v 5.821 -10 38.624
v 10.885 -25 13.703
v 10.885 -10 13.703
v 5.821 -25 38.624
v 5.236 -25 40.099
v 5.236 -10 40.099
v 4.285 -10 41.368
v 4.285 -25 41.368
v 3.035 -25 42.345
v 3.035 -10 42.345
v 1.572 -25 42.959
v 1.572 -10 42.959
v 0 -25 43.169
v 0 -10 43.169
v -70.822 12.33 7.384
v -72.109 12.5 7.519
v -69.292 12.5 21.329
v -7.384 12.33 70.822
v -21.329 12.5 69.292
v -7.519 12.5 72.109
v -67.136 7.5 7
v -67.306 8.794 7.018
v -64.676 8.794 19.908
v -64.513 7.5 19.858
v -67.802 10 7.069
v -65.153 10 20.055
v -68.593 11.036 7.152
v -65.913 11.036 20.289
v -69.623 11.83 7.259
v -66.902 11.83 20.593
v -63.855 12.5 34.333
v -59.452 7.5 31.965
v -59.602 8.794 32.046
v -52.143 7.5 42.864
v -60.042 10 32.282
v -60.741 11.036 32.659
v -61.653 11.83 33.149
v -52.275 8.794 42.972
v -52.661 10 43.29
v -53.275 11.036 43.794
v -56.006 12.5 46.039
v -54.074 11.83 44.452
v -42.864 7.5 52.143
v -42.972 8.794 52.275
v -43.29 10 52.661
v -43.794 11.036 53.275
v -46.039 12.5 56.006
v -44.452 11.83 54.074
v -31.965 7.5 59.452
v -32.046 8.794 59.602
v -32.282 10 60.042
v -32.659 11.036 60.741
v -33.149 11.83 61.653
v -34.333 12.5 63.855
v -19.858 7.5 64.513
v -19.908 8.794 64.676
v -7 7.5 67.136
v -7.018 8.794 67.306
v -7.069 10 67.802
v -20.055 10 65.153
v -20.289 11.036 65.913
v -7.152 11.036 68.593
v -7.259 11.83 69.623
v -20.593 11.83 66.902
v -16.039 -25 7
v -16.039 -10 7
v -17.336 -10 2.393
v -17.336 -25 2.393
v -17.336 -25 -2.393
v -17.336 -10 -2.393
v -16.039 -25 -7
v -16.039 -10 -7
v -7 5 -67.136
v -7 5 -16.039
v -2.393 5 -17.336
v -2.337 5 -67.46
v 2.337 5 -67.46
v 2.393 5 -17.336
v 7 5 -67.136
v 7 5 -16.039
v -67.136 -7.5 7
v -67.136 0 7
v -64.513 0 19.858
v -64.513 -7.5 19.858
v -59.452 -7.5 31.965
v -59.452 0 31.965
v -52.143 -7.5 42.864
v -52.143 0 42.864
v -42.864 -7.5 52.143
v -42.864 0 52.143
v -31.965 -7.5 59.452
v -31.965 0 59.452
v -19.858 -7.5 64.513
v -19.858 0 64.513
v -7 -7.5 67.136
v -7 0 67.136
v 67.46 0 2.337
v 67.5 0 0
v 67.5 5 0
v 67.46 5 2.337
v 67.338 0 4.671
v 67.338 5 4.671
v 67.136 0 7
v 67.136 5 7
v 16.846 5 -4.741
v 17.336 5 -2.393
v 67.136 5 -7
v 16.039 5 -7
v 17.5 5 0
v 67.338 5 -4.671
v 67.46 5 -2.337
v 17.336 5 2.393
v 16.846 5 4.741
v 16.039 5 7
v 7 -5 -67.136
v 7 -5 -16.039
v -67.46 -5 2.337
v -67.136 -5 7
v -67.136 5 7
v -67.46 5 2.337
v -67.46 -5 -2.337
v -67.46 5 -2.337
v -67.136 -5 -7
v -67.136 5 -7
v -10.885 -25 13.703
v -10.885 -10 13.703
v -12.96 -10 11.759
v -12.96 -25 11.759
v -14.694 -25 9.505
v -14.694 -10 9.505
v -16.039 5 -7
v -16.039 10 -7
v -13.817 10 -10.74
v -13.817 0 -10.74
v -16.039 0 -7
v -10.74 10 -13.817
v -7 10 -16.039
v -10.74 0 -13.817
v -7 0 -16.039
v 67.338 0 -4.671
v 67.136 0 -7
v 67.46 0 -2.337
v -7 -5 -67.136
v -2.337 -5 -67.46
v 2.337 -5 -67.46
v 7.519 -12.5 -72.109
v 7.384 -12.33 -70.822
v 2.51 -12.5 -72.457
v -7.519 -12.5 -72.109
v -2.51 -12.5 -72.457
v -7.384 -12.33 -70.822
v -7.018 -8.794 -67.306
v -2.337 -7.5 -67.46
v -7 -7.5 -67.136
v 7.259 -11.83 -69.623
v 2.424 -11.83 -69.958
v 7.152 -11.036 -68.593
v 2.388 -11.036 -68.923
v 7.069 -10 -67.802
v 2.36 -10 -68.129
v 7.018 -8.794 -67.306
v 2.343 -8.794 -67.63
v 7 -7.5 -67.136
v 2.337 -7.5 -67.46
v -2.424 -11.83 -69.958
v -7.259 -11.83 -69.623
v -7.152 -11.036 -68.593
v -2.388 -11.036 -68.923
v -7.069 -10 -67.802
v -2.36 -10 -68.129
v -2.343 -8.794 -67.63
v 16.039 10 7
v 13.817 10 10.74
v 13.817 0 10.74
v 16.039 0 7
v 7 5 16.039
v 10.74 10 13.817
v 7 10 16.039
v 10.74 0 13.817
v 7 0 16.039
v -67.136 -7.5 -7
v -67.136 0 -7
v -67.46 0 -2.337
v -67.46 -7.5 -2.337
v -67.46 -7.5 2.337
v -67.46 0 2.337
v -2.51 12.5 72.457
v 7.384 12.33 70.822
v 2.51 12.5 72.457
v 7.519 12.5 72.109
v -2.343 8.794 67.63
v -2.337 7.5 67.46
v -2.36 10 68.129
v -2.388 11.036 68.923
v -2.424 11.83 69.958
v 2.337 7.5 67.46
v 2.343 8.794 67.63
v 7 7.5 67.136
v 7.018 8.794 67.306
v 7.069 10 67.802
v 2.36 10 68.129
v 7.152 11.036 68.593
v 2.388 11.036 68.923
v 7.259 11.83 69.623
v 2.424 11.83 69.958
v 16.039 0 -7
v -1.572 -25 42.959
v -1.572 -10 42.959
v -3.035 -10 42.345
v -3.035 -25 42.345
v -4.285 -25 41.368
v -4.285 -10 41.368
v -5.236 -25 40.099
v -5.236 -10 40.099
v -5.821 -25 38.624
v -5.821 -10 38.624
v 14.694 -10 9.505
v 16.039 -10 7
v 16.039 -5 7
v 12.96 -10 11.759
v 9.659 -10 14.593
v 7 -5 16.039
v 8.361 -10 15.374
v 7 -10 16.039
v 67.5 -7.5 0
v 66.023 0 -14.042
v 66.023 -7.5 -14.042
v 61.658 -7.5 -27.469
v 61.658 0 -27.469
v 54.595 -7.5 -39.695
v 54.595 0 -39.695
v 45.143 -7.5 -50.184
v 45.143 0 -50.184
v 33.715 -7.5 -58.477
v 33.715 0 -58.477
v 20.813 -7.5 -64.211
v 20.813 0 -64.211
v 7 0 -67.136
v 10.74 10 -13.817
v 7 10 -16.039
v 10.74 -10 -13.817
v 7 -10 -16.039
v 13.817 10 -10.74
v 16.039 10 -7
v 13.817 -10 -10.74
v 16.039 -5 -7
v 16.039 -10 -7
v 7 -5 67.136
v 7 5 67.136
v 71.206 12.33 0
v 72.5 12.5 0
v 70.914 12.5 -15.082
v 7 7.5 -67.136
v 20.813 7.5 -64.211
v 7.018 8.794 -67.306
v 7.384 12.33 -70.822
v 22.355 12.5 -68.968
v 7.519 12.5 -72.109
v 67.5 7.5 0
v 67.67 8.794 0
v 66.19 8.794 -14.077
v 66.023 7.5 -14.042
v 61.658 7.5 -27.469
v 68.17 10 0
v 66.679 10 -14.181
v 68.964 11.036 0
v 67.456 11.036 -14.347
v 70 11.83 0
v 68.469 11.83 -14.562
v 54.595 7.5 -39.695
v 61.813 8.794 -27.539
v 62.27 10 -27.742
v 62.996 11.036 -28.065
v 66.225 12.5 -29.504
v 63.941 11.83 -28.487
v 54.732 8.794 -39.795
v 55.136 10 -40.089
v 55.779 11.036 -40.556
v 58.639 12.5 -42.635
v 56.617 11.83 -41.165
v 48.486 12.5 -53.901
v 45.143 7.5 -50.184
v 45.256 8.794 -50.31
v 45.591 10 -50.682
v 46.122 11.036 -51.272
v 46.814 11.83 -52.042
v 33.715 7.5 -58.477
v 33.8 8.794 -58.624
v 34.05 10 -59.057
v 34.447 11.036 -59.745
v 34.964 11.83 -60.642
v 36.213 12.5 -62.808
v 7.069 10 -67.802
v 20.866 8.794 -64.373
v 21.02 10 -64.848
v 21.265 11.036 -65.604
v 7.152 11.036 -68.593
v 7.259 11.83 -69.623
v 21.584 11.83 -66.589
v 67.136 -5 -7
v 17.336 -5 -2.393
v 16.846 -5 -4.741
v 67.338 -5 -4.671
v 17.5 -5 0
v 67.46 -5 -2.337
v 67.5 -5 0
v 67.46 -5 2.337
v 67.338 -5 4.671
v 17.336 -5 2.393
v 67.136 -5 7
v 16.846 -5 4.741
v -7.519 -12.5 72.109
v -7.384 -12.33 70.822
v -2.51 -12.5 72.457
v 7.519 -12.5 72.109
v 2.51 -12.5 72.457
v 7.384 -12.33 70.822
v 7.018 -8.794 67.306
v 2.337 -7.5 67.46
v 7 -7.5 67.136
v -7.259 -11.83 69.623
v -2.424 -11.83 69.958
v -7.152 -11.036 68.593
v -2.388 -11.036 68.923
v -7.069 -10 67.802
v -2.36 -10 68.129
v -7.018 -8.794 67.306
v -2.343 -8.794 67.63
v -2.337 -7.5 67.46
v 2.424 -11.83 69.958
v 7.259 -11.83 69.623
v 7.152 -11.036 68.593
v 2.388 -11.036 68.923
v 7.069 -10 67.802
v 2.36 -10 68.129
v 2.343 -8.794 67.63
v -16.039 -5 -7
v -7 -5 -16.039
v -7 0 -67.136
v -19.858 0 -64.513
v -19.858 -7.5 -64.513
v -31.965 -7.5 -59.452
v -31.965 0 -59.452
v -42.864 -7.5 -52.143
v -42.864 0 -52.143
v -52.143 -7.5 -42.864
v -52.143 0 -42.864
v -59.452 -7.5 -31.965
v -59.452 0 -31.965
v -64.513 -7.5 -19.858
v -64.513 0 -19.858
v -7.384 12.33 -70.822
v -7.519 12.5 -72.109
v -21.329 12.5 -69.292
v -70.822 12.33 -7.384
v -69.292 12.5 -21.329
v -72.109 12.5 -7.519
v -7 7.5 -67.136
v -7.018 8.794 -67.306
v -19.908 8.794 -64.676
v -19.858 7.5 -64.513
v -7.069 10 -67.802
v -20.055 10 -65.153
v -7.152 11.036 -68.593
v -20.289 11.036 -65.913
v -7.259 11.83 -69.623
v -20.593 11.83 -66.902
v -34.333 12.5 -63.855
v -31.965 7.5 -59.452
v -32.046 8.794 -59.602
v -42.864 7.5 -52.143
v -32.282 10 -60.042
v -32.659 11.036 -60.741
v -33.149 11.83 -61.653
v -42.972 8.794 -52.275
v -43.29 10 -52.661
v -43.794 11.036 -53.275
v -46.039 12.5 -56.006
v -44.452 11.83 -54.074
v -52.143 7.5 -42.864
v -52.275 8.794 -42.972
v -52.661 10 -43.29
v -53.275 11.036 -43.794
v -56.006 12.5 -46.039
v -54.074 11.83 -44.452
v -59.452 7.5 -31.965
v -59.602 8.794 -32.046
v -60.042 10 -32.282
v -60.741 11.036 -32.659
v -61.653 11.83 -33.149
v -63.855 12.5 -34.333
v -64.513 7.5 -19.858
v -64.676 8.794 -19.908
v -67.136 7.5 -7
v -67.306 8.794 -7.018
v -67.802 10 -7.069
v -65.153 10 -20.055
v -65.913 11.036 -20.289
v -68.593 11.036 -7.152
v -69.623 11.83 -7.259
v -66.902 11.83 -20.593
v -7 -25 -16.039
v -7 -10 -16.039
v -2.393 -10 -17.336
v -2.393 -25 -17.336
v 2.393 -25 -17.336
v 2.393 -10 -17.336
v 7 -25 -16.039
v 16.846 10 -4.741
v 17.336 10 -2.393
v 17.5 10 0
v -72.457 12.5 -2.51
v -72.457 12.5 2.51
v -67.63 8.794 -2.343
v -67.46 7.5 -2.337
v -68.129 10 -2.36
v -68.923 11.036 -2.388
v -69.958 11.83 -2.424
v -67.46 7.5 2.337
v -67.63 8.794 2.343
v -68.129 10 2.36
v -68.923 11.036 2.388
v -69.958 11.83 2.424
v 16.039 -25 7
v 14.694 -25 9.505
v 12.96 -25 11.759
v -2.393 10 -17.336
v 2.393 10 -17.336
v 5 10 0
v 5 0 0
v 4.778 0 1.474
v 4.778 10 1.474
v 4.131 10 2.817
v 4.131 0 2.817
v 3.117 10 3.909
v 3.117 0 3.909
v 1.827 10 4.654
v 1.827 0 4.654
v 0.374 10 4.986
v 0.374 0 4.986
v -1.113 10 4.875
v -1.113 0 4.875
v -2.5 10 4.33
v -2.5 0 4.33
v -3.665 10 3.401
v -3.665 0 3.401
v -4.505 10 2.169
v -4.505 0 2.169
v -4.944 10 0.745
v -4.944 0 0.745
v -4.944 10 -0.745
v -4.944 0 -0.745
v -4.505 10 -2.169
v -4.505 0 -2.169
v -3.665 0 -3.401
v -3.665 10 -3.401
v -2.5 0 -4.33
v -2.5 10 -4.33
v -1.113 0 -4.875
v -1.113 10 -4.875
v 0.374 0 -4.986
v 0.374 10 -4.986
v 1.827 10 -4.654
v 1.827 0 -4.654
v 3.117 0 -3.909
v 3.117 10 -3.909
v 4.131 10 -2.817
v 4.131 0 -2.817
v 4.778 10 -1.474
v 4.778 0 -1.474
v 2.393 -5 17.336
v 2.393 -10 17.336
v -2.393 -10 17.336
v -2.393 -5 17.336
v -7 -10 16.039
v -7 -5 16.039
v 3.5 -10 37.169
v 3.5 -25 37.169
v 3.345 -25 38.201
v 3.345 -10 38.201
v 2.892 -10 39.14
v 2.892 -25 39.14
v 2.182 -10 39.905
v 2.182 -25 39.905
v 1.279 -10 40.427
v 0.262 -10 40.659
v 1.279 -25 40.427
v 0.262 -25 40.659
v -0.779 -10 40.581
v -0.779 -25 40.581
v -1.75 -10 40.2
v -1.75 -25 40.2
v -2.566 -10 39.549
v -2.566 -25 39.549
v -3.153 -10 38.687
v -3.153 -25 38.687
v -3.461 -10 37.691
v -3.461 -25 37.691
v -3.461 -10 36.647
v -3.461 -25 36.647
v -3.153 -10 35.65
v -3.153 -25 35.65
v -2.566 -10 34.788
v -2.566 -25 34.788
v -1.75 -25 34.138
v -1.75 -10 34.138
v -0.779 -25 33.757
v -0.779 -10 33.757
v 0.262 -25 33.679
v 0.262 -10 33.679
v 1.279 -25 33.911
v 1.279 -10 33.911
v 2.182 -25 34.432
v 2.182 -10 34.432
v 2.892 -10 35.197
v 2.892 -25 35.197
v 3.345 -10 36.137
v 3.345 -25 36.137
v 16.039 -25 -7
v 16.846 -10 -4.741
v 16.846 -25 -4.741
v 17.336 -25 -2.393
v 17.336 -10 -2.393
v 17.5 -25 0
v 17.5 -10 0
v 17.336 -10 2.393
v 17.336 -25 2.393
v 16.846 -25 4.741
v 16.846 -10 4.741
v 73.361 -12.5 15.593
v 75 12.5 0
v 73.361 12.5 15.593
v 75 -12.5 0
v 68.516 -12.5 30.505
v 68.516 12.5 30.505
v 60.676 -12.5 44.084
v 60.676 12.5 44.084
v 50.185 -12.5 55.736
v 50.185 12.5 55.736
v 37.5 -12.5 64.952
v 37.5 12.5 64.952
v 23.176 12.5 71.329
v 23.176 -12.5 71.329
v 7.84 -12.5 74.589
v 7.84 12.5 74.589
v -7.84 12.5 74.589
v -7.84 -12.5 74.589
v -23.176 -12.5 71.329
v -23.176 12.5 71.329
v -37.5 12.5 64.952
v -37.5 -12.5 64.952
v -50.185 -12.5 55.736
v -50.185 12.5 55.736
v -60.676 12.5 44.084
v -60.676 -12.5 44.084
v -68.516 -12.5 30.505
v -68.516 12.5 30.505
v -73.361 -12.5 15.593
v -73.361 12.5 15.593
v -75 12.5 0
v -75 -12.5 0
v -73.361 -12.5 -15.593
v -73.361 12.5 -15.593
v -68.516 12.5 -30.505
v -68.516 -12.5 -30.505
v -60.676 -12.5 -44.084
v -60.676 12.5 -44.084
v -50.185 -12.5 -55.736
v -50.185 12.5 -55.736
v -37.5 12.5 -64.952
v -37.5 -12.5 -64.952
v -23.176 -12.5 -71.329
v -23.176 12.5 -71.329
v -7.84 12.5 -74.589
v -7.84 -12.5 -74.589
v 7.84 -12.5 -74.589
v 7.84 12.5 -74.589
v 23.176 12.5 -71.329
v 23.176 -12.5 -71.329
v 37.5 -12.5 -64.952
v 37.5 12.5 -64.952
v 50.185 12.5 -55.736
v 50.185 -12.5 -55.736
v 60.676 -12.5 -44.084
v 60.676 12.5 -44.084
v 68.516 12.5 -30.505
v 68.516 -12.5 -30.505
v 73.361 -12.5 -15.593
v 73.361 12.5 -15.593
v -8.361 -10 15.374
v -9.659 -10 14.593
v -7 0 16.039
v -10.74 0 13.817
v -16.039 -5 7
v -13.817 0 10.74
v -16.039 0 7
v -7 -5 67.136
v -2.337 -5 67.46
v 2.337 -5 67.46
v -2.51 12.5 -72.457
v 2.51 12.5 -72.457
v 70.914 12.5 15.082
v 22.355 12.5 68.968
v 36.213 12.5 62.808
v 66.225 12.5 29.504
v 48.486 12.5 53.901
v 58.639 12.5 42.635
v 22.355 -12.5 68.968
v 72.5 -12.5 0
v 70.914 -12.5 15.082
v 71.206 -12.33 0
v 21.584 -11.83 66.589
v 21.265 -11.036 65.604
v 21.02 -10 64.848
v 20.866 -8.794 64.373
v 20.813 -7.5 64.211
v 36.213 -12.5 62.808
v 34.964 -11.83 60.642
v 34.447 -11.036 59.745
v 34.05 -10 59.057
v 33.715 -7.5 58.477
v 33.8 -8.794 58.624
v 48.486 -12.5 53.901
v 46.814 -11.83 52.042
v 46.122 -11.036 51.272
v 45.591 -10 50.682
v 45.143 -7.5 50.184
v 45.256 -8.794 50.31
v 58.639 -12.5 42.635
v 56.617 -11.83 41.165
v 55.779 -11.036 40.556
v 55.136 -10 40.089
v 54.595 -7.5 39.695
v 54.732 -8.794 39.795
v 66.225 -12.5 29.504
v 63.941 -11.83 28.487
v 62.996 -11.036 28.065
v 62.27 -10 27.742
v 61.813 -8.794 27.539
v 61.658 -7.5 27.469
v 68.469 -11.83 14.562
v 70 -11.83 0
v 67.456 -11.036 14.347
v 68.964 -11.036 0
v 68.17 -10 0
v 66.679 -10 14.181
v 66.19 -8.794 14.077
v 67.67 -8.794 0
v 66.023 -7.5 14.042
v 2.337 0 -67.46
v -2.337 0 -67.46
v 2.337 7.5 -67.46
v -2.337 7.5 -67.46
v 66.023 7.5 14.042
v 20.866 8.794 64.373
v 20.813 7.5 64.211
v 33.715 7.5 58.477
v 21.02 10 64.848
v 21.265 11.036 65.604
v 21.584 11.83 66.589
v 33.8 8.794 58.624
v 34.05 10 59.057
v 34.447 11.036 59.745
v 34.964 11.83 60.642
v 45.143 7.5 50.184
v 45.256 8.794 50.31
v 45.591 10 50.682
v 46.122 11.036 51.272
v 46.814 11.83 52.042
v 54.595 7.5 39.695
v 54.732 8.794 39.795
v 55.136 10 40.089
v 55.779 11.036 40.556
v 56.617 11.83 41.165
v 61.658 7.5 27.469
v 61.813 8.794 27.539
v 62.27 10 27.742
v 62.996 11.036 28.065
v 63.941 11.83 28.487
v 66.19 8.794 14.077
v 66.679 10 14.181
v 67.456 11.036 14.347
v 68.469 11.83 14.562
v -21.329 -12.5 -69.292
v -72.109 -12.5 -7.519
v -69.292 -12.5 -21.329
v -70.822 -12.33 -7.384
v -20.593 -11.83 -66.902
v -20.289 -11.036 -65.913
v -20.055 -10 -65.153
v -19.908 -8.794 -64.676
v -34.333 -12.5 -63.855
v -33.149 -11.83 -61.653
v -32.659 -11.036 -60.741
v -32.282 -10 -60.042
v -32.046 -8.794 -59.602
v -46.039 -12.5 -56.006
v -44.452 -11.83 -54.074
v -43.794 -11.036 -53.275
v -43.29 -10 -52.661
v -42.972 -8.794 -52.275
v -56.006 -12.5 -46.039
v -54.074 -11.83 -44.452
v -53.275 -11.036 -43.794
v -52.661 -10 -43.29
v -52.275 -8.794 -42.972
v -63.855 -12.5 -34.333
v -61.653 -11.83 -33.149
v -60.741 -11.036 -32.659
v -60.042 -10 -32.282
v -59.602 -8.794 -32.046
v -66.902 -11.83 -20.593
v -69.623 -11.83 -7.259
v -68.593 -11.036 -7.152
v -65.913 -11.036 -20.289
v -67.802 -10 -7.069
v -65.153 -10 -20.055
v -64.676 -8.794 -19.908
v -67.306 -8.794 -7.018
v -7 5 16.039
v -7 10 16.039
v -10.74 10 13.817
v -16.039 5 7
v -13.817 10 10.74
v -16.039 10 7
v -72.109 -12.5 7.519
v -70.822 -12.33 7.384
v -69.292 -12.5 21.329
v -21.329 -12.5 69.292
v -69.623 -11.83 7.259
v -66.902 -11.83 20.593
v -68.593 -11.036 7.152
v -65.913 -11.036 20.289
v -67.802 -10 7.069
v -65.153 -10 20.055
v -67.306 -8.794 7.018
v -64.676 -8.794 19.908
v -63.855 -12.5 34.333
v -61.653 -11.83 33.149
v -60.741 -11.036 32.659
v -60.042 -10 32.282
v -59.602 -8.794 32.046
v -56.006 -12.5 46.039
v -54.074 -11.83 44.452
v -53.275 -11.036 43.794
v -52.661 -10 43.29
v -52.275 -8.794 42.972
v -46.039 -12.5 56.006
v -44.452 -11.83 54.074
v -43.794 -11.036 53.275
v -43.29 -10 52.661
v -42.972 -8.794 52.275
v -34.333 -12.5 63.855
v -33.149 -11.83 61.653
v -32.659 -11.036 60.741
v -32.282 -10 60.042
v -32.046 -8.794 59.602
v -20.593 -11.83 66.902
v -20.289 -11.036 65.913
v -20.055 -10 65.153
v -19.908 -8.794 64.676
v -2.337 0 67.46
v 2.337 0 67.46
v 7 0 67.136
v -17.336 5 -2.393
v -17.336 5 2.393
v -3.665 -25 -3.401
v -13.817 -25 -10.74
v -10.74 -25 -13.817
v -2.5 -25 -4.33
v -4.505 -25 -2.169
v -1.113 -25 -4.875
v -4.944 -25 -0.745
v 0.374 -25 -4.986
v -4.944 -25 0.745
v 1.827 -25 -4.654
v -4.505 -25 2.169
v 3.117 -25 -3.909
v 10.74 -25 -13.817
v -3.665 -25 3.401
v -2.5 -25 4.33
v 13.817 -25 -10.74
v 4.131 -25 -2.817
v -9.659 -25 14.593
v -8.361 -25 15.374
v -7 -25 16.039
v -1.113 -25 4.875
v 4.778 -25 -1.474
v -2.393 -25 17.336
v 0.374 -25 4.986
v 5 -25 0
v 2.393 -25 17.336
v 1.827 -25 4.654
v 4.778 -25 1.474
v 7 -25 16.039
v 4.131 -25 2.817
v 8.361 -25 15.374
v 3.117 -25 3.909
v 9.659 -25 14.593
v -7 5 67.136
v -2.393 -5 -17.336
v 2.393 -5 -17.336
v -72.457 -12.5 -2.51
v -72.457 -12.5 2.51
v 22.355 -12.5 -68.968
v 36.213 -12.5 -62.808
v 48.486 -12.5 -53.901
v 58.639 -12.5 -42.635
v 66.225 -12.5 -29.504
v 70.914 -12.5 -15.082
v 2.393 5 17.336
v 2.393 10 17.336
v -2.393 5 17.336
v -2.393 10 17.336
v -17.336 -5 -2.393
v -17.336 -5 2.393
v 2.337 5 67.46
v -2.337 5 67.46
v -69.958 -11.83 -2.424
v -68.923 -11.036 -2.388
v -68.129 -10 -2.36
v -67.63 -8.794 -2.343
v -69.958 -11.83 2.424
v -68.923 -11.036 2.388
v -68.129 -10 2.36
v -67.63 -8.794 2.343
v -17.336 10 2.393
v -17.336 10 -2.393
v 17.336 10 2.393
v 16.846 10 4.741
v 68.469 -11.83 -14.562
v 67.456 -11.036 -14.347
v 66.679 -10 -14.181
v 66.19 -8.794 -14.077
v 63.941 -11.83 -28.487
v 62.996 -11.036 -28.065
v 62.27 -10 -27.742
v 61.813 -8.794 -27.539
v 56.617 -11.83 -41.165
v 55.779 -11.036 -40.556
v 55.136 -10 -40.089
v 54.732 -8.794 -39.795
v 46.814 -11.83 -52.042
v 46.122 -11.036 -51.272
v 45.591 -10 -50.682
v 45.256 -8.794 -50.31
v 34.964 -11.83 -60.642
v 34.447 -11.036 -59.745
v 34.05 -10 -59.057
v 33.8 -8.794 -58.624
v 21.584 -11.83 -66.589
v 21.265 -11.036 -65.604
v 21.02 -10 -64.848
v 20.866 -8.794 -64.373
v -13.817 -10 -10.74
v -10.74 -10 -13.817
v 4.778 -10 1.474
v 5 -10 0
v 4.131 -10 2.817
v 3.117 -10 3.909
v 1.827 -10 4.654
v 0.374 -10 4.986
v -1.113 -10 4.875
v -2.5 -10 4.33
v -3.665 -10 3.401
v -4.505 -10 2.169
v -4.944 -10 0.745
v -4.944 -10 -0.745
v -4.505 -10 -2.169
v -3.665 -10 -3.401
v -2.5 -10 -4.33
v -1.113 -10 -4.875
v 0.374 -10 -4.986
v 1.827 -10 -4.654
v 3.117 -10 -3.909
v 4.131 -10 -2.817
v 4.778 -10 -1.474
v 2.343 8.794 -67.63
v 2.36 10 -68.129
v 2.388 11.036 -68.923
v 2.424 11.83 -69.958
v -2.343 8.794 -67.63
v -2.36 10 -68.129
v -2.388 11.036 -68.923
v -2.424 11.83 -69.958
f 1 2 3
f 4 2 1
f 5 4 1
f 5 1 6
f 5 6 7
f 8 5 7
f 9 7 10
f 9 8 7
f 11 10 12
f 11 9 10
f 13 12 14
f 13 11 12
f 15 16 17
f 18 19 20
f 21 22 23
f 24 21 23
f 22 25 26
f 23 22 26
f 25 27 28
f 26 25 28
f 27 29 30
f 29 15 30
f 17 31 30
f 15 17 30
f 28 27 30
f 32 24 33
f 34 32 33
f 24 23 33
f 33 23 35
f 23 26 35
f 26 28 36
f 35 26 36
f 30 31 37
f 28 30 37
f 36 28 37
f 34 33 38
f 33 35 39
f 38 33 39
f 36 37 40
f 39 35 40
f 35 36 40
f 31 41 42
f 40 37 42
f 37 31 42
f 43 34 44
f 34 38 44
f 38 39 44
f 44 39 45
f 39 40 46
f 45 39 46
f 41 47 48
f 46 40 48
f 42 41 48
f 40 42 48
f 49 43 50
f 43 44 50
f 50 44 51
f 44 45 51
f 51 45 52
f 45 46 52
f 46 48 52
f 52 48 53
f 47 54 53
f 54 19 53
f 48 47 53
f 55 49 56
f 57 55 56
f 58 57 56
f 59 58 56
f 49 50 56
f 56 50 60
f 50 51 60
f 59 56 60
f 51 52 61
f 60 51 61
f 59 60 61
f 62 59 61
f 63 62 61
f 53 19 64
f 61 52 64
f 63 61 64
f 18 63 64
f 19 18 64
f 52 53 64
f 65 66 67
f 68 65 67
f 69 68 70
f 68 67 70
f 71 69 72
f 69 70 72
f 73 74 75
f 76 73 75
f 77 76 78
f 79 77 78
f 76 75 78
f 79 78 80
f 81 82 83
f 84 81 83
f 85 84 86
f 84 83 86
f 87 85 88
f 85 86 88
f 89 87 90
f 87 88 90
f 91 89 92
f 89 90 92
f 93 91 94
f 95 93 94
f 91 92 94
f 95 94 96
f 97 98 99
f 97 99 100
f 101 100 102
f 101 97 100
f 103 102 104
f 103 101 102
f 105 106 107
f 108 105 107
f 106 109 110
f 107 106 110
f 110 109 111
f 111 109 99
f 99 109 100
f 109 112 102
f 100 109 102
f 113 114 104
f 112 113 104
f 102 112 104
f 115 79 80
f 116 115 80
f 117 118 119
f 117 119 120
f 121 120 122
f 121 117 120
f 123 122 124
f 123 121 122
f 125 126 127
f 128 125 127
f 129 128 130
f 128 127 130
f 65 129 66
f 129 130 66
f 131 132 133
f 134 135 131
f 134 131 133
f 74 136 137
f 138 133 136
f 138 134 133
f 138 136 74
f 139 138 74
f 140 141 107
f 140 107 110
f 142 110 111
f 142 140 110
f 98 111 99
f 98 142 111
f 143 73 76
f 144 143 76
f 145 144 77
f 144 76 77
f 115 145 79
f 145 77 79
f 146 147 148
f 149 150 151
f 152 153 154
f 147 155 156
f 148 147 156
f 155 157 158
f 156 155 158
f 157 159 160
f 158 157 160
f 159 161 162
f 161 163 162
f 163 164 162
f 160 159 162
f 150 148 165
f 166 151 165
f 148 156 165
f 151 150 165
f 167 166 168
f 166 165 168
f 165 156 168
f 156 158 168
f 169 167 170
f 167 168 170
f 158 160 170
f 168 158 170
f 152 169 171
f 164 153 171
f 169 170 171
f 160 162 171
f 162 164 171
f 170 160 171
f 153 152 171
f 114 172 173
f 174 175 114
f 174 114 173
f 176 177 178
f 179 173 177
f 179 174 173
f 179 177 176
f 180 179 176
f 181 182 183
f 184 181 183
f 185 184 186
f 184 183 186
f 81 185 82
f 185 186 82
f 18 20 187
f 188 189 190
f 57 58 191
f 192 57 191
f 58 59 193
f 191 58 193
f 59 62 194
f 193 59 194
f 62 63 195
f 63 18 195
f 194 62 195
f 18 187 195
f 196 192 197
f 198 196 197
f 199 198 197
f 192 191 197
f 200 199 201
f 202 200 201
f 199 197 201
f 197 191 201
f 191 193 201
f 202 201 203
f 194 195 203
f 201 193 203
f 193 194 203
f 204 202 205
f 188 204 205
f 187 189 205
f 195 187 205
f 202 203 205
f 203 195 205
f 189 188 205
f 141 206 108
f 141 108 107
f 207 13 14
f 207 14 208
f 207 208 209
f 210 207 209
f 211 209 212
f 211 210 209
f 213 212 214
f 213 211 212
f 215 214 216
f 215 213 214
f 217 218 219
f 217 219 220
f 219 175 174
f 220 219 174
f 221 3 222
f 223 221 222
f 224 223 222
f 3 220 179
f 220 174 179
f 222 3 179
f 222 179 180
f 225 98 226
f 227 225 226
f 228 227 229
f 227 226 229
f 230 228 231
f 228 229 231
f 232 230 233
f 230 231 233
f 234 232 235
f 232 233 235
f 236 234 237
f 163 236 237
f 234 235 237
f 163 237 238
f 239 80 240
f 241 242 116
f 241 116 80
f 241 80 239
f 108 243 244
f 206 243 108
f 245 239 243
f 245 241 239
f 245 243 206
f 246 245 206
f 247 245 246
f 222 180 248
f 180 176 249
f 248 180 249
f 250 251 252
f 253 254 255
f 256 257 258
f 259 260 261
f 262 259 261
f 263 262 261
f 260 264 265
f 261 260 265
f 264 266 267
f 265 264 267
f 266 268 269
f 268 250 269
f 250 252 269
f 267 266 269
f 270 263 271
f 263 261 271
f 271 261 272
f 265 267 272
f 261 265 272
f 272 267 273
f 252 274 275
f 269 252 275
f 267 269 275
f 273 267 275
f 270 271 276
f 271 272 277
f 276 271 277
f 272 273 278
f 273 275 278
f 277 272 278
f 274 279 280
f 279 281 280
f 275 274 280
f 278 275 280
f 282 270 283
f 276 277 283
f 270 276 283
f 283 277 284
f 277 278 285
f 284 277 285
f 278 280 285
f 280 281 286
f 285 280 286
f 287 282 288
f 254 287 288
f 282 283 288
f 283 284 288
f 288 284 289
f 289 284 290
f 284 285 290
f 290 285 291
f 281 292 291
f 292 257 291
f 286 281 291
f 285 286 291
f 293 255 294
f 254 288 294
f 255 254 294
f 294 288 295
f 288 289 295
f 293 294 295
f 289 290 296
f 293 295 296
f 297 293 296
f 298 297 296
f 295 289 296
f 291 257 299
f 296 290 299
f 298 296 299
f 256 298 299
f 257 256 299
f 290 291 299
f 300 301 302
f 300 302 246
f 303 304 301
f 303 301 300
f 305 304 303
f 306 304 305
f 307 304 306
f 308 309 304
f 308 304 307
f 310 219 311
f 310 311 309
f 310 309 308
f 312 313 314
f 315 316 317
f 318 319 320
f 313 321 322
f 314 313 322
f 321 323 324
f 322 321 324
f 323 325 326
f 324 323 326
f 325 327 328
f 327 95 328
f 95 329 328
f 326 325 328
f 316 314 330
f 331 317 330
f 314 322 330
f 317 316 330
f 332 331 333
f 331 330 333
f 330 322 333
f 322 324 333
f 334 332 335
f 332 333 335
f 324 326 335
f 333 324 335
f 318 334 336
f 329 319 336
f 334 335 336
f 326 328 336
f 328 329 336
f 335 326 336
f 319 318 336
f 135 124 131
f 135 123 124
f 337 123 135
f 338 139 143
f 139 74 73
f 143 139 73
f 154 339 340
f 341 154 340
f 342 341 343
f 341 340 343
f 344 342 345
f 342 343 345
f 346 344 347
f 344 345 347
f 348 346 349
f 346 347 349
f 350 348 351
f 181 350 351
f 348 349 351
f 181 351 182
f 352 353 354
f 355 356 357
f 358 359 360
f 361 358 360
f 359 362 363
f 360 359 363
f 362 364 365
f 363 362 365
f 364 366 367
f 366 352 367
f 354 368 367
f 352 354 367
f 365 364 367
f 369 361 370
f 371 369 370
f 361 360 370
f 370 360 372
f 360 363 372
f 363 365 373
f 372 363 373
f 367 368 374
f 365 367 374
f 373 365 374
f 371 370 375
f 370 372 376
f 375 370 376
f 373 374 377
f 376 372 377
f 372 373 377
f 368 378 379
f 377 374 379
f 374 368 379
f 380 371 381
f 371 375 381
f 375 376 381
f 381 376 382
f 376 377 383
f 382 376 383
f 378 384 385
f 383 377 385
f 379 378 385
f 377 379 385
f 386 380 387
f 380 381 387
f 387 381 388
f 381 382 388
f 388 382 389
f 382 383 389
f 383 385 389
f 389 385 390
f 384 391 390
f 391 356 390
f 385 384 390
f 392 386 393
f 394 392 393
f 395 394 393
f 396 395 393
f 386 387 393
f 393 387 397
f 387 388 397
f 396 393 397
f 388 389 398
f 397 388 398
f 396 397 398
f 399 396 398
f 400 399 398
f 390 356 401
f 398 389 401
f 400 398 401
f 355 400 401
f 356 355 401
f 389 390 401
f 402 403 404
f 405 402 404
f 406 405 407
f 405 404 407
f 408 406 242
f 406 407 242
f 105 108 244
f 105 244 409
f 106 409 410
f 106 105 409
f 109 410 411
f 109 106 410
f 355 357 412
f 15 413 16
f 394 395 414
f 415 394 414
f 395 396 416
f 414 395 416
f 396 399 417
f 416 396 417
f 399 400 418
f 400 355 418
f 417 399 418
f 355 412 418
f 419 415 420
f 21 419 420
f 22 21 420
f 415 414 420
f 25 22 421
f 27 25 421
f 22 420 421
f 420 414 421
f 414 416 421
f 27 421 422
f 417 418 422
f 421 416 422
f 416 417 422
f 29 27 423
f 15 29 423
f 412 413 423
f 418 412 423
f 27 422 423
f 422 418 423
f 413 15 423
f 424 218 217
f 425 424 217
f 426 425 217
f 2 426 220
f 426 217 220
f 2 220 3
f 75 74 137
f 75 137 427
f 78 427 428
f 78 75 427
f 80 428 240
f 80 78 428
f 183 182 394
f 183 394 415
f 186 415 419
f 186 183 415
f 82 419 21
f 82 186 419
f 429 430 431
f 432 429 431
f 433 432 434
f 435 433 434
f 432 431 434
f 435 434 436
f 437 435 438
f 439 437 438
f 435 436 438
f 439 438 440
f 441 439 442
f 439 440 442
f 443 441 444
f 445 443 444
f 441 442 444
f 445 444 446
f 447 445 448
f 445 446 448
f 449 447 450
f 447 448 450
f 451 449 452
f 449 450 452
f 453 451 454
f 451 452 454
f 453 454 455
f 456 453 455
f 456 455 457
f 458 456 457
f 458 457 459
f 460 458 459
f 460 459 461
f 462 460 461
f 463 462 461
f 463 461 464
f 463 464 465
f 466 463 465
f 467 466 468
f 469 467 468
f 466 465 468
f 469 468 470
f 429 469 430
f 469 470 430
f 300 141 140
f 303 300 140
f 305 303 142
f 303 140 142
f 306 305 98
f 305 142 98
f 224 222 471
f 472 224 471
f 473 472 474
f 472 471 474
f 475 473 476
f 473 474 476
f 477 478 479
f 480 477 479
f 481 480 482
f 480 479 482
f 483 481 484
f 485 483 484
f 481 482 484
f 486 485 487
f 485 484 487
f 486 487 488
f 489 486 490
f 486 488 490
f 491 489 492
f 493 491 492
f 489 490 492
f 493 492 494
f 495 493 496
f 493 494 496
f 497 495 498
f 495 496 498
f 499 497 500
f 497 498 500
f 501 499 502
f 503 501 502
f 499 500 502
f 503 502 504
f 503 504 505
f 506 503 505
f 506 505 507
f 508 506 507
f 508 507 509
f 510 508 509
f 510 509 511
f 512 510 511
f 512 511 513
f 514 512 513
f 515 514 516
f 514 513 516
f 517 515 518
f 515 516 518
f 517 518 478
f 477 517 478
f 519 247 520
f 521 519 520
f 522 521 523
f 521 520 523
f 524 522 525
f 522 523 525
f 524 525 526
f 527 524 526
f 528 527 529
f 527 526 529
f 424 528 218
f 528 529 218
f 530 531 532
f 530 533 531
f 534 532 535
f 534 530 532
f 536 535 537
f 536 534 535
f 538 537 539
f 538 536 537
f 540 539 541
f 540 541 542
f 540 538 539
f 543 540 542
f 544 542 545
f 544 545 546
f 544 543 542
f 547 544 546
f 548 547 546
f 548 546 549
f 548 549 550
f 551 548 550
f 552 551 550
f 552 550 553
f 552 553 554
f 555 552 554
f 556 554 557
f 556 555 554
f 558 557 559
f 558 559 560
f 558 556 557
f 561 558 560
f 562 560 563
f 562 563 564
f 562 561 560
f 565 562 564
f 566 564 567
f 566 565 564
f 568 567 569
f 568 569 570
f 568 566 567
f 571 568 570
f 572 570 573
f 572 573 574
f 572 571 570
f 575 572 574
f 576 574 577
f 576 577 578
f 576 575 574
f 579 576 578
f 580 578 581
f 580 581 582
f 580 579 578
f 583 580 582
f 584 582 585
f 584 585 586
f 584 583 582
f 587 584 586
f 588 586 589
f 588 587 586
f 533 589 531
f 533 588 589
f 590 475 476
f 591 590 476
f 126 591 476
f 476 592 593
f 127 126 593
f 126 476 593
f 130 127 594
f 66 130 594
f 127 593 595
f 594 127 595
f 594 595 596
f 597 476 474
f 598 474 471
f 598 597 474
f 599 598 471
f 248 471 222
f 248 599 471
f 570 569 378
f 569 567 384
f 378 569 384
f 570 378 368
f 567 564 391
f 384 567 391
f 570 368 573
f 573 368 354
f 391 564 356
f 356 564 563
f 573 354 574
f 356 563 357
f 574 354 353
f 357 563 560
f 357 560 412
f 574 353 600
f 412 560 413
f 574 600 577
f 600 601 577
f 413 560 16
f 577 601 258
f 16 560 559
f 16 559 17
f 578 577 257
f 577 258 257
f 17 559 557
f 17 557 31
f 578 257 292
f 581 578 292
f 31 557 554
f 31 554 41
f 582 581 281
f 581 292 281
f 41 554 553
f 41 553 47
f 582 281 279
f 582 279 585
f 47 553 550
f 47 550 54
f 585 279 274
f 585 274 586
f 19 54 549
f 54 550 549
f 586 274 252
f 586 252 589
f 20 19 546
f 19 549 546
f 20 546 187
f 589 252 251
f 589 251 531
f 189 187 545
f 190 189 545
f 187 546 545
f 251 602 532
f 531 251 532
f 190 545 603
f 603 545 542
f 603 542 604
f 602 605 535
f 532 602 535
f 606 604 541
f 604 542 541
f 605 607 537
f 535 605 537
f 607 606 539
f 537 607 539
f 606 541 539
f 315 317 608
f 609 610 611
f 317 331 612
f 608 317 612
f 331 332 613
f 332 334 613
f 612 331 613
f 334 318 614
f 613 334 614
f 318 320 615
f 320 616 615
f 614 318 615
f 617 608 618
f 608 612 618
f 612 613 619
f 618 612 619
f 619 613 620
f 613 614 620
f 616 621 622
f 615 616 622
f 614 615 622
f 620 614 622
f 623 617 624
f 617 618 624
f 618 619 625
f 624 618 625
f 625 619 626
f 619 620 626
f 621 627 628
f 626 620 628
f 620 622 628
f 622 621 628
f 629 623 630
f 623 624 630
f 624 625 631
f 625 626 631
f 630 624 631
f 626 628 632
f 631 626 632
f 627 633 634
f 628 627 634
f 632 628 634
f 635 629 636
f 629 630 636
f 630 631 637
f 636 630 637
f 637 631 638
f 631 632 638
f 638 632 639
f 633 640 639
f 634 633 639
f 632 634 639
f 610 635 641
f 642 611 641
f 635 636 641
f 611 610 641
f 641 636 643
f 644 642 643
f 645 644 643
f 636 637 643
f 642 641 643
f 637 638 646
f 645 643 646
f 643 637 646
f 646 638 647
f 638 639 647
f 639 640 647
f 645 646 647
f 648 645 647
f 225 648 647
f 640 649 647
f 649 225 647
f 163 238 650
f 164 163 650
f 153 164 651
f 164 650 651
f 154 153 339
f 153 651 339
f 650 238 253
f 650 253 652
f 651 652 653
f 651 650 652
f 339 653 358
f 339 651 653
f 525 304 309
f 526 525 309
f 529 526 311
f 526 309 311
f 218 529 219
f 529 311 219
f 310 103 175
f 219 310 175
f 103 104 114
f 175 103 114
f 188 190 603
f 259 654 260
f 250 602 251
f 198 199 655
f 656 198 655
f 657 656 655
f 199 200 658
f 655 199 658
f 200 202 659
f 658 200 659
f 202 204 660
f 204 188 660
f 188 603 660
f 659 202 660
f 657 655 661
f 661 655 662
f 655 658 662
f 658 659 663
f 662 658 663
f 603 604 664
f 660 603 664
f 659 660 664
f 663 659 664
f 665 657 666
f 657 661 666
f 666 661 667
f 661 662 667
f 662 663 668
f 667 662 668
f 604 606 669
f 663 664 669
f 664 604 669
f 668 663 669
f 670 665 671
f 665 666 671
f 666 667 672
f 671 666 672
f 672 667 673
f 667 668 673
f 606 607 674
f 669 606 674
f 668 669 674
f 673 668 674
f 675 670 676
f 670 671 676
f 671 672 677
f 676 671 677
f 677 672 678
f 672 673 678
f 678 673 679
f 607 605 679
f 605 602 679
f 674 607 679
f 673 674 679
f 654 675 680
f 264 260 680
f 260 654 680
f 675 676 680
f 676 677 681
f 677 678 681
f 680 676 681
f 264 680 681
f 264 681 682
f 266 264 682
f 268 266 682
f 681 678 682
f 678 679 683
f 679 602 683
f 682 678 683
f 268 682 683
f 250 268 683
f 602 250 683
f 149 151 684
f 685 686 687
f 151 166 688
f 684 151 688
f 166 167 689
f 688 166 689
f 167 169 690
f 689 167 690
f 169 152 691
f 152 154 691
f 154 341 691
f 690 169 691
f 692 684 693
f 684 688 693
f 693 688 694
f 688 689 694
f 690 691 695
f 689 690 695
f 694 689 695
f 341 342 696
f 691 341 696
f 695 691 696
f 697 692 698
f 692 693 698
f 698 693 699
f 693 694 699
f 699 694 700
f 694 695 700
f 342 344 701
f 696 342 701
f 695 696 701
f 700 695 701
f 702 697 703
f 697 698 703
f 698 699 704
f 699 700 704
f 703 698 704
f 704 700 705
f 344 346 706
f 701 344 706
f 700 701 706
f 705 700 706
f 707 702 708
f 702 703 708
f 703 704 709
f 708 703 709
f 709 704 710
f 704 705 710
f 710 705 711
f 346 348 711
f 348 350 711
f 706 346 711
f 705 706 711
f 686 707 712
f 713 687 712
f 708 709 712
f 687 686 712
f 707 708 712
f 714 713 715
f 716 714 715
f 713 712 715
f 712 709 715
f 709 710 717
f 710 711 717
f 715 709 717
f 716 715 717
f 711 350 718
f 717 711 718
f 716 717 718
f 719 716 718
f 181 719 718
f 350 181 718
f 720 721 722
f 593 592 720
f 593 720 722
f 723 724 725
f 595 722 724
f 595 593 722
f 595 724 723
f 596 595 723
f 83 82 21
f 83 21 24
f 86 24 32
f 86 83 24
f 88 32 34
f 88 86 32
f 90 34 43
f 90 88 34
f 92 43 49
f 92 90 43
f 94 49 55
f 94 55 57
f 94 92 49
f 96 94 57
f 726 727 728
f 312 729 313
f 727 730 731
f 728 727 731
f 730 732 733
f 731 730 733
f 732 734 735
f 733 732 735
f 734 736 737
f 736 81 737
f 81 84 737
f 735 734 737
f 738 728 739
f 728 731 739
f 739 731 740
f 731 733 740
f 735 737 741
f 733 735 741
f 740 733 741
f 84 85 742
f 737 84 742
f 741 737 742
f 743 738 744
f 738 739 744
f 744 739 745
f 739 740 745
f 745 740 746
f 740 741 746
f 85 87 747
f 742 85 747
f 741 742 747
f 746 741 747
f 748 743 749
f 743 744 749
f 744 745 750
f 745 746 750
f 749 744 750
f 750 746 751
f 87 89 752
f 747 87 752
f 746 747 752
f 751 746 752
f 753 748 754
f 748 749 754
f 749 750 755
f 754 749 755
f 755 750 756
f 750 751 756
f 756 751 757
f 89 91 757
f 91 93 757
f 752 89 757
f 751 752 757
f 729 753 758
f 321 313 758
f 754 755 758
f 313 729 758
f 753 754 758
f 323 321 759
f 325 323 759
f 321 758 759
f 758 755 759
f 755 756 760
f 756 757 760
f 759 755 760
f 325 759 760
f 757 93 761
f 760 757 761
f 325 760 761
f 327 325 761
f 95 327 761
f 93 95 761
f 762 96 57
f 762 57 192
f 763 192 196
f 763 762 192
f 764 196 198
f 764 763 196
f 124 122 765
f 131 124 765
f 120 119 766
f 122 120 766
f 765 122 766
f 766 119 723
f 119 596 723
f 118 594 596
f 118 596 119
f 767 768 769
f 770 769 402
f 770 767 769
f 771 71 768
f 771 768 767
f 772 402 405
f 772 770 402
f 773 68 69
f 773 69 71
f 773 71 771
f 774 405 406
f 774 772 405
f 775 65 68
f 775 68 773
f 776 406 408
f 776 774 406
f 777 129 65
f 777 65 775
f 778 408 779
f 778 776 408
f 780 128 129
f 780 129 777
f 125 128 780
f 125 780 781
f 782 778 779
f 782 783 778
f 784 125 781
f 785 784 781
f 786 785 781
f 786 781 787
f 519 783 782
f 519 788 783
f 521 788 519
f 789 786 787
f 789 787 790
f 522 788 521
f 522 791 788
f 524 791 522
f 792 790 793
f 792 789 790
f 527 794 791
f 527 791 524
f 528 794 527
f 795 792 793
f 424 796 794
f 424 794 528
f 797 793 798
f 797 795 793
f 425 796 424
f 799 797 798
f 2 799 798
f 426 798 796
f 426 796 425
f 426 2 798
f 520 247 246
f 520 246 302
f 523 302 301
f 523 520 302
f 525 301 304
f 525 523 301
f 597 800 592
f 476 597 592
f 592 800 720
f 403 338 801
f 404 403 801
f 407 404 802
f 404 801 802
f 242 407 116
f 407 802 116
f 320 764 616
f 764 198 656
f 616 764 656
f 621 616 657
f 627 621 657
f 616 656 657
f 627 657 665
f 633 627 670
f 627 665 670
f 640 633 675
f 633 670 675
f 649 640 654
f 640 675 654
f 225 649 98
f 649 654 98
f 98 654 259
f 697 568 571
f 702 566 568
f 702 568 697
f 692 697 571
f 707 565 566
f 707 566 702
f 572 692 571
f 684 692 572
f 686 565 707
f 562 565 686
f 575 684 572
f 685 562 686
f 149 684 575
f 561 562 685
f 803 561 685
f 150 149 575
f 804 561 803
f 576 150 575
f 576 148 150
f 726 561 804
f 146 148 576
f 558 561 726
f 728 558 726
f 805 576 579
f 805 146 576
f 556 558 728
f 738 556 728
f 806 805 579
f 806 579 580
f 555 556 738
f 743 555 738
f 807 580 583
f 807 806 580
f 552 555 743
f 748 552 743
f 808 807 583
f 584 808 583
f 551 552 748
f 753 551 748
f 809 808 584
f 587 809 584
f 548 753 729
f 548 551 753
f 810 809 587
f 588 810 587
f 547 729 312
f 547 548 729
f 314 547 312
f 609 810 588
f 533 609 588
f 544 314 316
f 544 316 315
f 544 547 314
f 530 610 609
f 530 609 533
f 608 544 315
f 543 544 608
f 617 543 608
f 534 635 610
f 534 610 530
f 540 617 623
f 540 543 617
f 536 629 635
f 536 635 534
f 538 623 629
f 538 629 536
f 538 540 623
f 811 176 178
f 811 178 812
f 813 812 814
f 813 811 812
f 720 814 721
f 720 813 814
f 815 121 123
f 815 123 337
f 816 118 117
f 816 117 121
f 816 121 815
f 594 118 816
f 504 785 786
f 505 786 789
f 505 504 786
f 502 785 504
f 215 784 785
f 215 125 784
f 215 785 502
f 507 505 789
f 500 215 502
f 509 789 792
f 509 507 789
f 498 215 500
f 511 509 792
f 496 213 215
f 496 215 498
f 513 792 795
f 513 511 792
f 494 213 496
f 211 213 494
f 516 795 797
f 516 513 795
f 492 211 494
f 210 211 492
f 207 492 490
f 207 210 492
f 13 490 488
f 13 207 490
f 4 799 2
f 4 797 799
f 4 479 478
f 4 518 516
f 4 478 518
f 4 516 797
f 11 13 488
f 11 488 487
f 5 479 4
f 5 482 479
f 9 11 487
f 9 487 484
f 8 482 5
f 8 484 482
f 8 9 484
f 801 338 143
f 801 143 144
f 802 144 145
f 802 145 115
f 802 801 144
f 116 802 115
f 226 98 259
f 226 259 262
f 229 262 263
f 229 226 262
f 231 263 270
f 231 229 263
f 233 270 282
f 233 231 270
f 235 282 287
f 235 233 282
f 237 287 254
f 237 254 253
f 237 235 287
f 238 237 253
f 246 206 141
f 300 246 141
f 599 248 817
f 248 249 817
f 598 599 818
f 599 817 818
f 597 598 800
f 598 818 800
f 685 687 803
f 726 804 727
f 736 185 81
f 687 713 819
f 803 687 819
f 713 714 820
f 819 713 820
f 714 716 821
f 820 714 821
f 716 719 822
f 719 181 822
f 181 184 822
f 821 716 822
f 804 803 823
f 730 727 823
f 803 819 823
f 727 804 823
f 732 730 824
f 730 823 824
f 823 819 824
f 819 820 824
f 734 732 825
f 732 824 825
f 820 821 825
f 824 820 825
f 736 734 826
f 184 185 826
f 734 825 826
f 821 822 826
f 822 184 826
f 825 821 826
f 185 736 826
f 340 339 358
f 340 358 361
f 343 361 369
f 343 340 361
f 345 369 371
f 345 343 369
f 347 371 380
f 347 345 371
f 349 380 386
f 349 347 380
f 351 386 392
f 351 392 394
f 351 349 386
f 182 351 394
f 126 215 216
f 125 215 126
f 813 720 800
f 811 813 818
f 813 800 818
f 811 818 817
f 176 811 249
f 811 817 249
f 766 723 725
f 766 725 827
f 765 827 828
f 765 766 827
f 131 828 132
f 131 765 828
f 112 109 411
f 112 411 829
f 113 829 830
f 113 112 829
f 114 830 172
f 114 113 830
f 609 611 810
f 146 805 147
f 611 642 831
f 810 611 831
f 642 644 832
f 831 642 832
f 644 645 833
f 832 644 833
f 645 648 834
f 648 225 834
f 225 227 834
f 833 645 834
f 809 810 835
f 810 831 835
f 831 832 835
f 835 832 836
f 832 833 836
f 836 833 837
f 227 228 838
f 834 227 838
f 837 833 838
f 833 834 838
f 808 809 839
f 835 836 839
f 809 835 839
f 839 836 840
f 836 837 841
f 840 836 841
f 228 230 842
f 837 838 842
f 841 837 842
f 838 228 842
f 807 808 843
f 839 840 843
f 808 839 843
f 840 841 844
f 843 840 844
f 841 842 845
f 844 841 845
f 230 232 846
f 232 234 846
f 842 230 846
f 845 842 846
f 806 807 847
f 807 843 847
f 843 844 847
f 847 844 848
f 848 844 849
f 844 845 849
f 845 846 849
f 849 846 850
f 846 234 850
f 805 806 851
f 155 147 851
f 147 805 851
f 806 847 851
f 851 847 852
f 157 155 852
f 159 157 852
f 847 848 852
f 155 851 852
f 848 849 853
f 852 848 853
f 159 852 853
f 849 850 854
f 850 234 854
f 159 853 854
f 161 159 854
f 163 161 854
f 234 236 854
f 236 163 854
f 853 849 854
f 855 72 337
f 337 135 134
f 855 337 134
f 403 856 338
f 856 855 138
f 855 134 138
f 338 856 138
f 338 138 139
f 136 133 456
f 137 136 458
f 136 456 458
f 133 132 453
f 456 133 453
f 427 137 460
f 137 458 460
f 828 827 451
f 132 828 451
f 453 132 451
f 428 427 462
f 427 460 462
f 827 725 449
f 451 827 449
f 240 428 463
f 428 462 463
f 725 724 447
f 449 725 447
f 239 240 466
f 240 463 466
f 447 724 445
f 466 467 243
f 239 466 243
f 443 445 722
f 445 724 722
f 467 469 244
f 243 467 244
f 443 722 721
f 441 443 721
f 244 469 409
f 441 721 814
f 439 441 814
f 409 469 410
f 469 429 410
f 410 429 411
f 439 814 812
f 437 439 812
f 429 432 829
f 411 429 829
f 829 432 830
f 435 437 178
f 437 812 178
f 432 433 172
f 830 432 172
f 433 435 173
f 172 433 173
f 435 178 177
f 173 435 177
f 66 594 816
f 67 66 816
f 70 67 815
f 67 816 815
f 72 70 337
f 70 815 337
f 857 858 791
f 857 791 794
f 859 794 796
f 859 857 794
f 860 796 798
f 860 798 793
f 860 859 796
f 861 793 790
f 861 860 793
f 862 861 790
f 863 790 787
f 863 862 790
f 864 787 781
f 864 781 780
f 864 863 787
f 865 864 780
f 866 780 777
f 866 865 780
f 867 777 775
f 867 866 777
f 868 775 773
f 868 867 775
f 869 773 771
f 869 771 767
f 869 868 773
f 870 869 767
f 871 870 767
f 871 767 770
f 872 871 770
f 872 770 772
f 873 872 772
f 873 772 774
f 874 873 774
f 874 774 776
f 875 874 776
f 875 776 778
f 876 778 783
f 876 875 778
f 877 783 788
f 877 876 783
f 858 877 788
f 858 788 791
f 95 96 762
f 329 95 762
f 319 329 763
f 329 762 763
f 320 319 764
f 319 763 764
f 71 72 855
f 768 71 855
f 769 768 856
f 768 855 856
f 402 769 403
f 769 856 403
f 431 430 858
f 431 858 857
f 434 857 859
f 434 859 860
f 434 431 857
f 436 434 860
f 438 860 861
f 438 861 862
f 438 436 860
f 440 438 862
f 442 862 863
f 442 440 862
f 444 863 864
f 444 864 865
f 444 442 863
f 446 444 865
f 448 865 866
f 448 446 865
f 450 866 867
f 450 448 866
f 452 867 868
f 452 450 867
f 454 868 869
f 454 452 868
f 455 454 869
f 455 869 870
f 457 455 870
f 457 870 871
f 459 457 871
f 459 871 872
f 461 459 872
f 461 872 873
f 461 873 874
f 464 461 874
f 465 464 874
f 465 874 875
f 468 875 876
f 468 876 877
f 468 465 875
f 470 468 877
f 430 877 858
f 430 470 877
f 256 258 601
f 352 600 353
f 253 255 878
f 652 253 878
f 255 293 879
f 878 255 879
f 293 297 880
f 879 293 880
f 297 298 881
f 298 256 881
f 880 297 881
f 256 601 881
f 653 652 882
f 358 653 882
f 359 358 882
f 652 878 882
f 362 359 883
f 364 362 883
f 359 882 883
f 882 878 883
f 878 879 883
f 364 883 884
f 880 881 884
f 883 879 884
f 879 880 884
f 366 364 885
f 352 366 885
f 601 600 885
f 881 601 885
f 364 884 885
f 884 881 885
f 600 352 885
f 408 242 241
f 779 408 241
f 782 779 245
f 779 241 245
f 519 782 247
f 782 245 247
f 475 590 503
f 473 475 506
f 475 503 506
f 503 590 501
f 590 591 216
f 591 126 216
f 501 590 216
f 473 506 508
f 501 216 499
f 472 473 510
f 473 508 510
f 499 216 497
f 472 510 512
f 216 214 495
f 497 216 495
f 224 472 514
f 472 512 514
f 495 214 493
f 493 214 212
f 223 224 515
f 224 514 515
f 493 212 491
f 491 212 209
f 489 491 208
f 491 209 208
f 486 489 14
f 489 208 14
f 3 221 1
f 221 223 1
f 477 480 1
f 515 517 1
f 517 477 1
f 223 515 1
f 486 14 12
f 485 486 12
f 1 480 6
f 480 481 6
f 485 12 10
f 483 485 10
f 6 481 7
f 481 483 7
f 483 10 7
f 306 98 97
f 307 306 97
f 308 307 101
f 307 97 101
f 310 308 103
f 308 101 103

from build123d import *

# Parameters (mm, degrees)
F0_R     = 75
F1_DEPTH = 12.5
F0_R_2   = 5
F2_DEPTH = 10
F3_DEPTH = 5
F4_R     = 5
F5_DEPTH = 15
F6_R     = 3.5
F7_DEPTH = 15
F8_R     = 5


with BuildPart() as f1:
    # F0 (on Front) → F1 (new body, symmetric)
    with BuildSketch(Plane.XZ):
        Circle(F0_R)
        with BuildLine():
            ThreePointArc((7, 67.1360558865), (47.7297077301, 47.7297077301), (67.1360558865, 7))
            ThreePointArc((67.1360558865, 7), (67.4089525669, 3.5047273545), (67.5, 0))
            ThreePointArc((67.5, 0), (67.4089525669, -3.5047273545), (67.1360558865, -7))
            ThreePointArc((67.1360558865, -7), (47.7297077301, -47.7297077301), (7, -67.1360558865))
            ThreePointArc((7, -67.1360558865), (0, -67.5), (-7, -67.1360558865))
            ThreePointArc((-7, -67.1360558865), (-47.7297077301, -47.7297077301), (-67.1360558865, -7))
            ThreePointArc((-67.1360558865, -7), (-67.5, 0), (-67.1360558865, 7))
            ThreePointArc((-67.1360558865, 7), (-47.7297077301, 47.7297077301), (-7, 67.1360558865))
            ThreePointArc((-7, 67.1360558865), (0, 67.5), (7, 67.1360558865))
        make_face(mode=Mode.SUBTRACT)
    extrude(amount=F1_DEPTH, both=True)

    # F8
    f8_edges = [f1.edges().sort_by_distance(p)[0] for p in [
        (-67.5, -12.5, 0),
        (-67.5, 12.5, 0),
    ]]
    fillet(f8_edges, radius=F8_R)


with BuildPart() as f2:
    # F0 (on Front) → F2 (new body, symmetric)
    with BuildSketch(Plane.XZ):
        with BuildLine():
            ThreePointArc((16.0390149323, -7), (17.1308604763, -3.5754187646), (17.5, 0))
            ThreePointArc((17.5, 0), (17.1308604763, 3.5754187646), (16.0390149323, 7))
            ThreePointArc((16.0390149323, 7), (12.3743686708, 12.3743686708), (7, 16.0390149323))
            ThreePointArc((7, 16.0390149323), (0, 17.5), (-7, 16.0390149323))
            ThreePointArc((-7, 16.0390149323), (-12.3743686708, 12.3743686708), (-16.0390149323, 7))
            ThreePointArc((-16.0390149323, 7), (-17.5, 0), (-16.0390149323, -7))
            ThreePointArc((-16.0390149323, -7), (-12.3743686708, -12.3743686708), (-7, -16.0390149323))
            ThreePointArc((-7, -16.0390149323), (0, -17.5), (7, -16.0390149323))
            ThreePointArc((7, -16.0390149323), (12.3743686708, -12.3743686708), (16.0390149323, -7))
        make_face()
        Circle(F0_R_2, mode=Mode.SUBTRACT)
    extrude(amount=F2_DEPTH, both=True)

    # F0 (on Front) → F3 (join, symmetric)
    with BuildSketch(Plane.XZ):
        with BuildLine():
            ThreePointArc((-7, 16.0390149323), (0, 17.5), (7, 16.0390149323))
            Line((7, 16.0390149323), (7, 67.1360558865))
            ThreePointArc((7, 67.1360558865), (0, 67.5), (-7, 67.1360558865))
            Line((-7, 67.1360558865), (-7, 16.0390149323))
        make_face()
        with BuildLine():
            ThreePointArc((16.0390149323, 7), (17.1308604763, 3.5754187646), (17.5, 0))
            ThreePointArc((17.5, 0), (17.1308604763, -3.5754187646), (16.0390149323, -7))
            Line((16.0390149323, -7), (67.1360558865, -7))
            ThreePointArc((67.1360558865, -7), (67.4089525669, -3.5047273545), (67.5, 0))
            ThreePointArc((67.5, 0), (67.4089525669, 3.5047273545), (67.1360558865, 7))
            Line((67.1360558865, 7), (16.0390149323, 7))
        make_face()
        with BuildLine():
            Line((7, -67.1360558865), (7, -16.0390149323))
            ThreePointArc((7, -16.0390149323), (0, -17.5), (-7, -16.0390149323))
            Line((-7, -16.0390149323), (-7, -67.1360558865))
            ThreePointArc((-7, -67.1360558865), (0, -67.5), (7, -67.1360558865))
        make_face()
        with BuildLine():
            ThreePointArc((-16.0390149323, -7), (-17.5, 0), (-16.0390149323, 7))
            Line((-16.0390149323, 7), (-67.1360558865, 7))
            ThreePointArc((-67.1360558865, 7), (-67.5, 0), (-67.1360558865, -7))
            Line((-67.1360558865, -7), (-16.0390149323, -7))
        make_face()
    extrude(amount=F3_DEPTH, both=True)

    # F4 (on face) → F5 (join)
    with BuildSketch(Plane.XZ.offset(10)):
        with BuildLine():
            ThreePointArc((16.0390149323, -7), (17.1308604763, -3.5754187646), (17.5, 0))
            ThreePointArc((17.5, 0), (17.1308604763, 3.5754187646), (16.0390149323, 7))
            ThreePointArc((16.0390149323, 7), (12.3743686708, 12.3743686708), (7, 16.0390149323))
            ThreePointArc((7, 16.0390149323), (0, 17.5), (-7, 16.0390149323))
            ThreePointArc((-7, 16.0390149323), (-12.3743686708, 12.3743686708), (-16.0390149323, 7))
            ThreePointArc((-16.0390149323, 7), (-17.5, 0), (-16.0390149323, -7))
            ThreePointArc((-16.0390149323, -7), (-12.3743686708, -12.3743686708), (-7, -16.0390149323))
            ThreePointArc((-7, -16.0390149323), (0, -17.5), (7, -16.0390149323))
            ThreePointArc((7, -16.0390149323), (12.3743686708, -12.3743686708), (16.0390149323, -7))
        make_face()
        Circle(F4_R, mode=Mode.SUBTRACT)
    extrude(amount=F5_DEPTH)

    # F6 (on face) → F7 (join)
    with BuildSketch(Plane.XZ.offset(25)):
        with BuildLine():
            Line((-5.8208550274, 38.6240740795), (-10.884780211, 13.7029763102))
            ThreePointArc((-10.884780211, 13.7029763102), (0, 17.5), (10.884780211, 13.7029763102))
            Line((10.884780211, 13.7029763102), (5.8208550274, 38.6240740795))
            ThreePointArc((5.8208550274, 38.6240740795), (3.6924732995, 41.8980930299), (0, 43.1688604355))
            ThreePointArc((0, 43.1688604355), (-3.6924732995, 41.8980930299), (-5.8208550274, 38.6240740795))
        make_face()
        with Locations((0, 37.1688604355)):
            Circle(F6_R, mode=Mode.SUBTRACT)
    extrude(amount=-F7_DEPTH)


solid = Compound([f1.part, f2.part])
